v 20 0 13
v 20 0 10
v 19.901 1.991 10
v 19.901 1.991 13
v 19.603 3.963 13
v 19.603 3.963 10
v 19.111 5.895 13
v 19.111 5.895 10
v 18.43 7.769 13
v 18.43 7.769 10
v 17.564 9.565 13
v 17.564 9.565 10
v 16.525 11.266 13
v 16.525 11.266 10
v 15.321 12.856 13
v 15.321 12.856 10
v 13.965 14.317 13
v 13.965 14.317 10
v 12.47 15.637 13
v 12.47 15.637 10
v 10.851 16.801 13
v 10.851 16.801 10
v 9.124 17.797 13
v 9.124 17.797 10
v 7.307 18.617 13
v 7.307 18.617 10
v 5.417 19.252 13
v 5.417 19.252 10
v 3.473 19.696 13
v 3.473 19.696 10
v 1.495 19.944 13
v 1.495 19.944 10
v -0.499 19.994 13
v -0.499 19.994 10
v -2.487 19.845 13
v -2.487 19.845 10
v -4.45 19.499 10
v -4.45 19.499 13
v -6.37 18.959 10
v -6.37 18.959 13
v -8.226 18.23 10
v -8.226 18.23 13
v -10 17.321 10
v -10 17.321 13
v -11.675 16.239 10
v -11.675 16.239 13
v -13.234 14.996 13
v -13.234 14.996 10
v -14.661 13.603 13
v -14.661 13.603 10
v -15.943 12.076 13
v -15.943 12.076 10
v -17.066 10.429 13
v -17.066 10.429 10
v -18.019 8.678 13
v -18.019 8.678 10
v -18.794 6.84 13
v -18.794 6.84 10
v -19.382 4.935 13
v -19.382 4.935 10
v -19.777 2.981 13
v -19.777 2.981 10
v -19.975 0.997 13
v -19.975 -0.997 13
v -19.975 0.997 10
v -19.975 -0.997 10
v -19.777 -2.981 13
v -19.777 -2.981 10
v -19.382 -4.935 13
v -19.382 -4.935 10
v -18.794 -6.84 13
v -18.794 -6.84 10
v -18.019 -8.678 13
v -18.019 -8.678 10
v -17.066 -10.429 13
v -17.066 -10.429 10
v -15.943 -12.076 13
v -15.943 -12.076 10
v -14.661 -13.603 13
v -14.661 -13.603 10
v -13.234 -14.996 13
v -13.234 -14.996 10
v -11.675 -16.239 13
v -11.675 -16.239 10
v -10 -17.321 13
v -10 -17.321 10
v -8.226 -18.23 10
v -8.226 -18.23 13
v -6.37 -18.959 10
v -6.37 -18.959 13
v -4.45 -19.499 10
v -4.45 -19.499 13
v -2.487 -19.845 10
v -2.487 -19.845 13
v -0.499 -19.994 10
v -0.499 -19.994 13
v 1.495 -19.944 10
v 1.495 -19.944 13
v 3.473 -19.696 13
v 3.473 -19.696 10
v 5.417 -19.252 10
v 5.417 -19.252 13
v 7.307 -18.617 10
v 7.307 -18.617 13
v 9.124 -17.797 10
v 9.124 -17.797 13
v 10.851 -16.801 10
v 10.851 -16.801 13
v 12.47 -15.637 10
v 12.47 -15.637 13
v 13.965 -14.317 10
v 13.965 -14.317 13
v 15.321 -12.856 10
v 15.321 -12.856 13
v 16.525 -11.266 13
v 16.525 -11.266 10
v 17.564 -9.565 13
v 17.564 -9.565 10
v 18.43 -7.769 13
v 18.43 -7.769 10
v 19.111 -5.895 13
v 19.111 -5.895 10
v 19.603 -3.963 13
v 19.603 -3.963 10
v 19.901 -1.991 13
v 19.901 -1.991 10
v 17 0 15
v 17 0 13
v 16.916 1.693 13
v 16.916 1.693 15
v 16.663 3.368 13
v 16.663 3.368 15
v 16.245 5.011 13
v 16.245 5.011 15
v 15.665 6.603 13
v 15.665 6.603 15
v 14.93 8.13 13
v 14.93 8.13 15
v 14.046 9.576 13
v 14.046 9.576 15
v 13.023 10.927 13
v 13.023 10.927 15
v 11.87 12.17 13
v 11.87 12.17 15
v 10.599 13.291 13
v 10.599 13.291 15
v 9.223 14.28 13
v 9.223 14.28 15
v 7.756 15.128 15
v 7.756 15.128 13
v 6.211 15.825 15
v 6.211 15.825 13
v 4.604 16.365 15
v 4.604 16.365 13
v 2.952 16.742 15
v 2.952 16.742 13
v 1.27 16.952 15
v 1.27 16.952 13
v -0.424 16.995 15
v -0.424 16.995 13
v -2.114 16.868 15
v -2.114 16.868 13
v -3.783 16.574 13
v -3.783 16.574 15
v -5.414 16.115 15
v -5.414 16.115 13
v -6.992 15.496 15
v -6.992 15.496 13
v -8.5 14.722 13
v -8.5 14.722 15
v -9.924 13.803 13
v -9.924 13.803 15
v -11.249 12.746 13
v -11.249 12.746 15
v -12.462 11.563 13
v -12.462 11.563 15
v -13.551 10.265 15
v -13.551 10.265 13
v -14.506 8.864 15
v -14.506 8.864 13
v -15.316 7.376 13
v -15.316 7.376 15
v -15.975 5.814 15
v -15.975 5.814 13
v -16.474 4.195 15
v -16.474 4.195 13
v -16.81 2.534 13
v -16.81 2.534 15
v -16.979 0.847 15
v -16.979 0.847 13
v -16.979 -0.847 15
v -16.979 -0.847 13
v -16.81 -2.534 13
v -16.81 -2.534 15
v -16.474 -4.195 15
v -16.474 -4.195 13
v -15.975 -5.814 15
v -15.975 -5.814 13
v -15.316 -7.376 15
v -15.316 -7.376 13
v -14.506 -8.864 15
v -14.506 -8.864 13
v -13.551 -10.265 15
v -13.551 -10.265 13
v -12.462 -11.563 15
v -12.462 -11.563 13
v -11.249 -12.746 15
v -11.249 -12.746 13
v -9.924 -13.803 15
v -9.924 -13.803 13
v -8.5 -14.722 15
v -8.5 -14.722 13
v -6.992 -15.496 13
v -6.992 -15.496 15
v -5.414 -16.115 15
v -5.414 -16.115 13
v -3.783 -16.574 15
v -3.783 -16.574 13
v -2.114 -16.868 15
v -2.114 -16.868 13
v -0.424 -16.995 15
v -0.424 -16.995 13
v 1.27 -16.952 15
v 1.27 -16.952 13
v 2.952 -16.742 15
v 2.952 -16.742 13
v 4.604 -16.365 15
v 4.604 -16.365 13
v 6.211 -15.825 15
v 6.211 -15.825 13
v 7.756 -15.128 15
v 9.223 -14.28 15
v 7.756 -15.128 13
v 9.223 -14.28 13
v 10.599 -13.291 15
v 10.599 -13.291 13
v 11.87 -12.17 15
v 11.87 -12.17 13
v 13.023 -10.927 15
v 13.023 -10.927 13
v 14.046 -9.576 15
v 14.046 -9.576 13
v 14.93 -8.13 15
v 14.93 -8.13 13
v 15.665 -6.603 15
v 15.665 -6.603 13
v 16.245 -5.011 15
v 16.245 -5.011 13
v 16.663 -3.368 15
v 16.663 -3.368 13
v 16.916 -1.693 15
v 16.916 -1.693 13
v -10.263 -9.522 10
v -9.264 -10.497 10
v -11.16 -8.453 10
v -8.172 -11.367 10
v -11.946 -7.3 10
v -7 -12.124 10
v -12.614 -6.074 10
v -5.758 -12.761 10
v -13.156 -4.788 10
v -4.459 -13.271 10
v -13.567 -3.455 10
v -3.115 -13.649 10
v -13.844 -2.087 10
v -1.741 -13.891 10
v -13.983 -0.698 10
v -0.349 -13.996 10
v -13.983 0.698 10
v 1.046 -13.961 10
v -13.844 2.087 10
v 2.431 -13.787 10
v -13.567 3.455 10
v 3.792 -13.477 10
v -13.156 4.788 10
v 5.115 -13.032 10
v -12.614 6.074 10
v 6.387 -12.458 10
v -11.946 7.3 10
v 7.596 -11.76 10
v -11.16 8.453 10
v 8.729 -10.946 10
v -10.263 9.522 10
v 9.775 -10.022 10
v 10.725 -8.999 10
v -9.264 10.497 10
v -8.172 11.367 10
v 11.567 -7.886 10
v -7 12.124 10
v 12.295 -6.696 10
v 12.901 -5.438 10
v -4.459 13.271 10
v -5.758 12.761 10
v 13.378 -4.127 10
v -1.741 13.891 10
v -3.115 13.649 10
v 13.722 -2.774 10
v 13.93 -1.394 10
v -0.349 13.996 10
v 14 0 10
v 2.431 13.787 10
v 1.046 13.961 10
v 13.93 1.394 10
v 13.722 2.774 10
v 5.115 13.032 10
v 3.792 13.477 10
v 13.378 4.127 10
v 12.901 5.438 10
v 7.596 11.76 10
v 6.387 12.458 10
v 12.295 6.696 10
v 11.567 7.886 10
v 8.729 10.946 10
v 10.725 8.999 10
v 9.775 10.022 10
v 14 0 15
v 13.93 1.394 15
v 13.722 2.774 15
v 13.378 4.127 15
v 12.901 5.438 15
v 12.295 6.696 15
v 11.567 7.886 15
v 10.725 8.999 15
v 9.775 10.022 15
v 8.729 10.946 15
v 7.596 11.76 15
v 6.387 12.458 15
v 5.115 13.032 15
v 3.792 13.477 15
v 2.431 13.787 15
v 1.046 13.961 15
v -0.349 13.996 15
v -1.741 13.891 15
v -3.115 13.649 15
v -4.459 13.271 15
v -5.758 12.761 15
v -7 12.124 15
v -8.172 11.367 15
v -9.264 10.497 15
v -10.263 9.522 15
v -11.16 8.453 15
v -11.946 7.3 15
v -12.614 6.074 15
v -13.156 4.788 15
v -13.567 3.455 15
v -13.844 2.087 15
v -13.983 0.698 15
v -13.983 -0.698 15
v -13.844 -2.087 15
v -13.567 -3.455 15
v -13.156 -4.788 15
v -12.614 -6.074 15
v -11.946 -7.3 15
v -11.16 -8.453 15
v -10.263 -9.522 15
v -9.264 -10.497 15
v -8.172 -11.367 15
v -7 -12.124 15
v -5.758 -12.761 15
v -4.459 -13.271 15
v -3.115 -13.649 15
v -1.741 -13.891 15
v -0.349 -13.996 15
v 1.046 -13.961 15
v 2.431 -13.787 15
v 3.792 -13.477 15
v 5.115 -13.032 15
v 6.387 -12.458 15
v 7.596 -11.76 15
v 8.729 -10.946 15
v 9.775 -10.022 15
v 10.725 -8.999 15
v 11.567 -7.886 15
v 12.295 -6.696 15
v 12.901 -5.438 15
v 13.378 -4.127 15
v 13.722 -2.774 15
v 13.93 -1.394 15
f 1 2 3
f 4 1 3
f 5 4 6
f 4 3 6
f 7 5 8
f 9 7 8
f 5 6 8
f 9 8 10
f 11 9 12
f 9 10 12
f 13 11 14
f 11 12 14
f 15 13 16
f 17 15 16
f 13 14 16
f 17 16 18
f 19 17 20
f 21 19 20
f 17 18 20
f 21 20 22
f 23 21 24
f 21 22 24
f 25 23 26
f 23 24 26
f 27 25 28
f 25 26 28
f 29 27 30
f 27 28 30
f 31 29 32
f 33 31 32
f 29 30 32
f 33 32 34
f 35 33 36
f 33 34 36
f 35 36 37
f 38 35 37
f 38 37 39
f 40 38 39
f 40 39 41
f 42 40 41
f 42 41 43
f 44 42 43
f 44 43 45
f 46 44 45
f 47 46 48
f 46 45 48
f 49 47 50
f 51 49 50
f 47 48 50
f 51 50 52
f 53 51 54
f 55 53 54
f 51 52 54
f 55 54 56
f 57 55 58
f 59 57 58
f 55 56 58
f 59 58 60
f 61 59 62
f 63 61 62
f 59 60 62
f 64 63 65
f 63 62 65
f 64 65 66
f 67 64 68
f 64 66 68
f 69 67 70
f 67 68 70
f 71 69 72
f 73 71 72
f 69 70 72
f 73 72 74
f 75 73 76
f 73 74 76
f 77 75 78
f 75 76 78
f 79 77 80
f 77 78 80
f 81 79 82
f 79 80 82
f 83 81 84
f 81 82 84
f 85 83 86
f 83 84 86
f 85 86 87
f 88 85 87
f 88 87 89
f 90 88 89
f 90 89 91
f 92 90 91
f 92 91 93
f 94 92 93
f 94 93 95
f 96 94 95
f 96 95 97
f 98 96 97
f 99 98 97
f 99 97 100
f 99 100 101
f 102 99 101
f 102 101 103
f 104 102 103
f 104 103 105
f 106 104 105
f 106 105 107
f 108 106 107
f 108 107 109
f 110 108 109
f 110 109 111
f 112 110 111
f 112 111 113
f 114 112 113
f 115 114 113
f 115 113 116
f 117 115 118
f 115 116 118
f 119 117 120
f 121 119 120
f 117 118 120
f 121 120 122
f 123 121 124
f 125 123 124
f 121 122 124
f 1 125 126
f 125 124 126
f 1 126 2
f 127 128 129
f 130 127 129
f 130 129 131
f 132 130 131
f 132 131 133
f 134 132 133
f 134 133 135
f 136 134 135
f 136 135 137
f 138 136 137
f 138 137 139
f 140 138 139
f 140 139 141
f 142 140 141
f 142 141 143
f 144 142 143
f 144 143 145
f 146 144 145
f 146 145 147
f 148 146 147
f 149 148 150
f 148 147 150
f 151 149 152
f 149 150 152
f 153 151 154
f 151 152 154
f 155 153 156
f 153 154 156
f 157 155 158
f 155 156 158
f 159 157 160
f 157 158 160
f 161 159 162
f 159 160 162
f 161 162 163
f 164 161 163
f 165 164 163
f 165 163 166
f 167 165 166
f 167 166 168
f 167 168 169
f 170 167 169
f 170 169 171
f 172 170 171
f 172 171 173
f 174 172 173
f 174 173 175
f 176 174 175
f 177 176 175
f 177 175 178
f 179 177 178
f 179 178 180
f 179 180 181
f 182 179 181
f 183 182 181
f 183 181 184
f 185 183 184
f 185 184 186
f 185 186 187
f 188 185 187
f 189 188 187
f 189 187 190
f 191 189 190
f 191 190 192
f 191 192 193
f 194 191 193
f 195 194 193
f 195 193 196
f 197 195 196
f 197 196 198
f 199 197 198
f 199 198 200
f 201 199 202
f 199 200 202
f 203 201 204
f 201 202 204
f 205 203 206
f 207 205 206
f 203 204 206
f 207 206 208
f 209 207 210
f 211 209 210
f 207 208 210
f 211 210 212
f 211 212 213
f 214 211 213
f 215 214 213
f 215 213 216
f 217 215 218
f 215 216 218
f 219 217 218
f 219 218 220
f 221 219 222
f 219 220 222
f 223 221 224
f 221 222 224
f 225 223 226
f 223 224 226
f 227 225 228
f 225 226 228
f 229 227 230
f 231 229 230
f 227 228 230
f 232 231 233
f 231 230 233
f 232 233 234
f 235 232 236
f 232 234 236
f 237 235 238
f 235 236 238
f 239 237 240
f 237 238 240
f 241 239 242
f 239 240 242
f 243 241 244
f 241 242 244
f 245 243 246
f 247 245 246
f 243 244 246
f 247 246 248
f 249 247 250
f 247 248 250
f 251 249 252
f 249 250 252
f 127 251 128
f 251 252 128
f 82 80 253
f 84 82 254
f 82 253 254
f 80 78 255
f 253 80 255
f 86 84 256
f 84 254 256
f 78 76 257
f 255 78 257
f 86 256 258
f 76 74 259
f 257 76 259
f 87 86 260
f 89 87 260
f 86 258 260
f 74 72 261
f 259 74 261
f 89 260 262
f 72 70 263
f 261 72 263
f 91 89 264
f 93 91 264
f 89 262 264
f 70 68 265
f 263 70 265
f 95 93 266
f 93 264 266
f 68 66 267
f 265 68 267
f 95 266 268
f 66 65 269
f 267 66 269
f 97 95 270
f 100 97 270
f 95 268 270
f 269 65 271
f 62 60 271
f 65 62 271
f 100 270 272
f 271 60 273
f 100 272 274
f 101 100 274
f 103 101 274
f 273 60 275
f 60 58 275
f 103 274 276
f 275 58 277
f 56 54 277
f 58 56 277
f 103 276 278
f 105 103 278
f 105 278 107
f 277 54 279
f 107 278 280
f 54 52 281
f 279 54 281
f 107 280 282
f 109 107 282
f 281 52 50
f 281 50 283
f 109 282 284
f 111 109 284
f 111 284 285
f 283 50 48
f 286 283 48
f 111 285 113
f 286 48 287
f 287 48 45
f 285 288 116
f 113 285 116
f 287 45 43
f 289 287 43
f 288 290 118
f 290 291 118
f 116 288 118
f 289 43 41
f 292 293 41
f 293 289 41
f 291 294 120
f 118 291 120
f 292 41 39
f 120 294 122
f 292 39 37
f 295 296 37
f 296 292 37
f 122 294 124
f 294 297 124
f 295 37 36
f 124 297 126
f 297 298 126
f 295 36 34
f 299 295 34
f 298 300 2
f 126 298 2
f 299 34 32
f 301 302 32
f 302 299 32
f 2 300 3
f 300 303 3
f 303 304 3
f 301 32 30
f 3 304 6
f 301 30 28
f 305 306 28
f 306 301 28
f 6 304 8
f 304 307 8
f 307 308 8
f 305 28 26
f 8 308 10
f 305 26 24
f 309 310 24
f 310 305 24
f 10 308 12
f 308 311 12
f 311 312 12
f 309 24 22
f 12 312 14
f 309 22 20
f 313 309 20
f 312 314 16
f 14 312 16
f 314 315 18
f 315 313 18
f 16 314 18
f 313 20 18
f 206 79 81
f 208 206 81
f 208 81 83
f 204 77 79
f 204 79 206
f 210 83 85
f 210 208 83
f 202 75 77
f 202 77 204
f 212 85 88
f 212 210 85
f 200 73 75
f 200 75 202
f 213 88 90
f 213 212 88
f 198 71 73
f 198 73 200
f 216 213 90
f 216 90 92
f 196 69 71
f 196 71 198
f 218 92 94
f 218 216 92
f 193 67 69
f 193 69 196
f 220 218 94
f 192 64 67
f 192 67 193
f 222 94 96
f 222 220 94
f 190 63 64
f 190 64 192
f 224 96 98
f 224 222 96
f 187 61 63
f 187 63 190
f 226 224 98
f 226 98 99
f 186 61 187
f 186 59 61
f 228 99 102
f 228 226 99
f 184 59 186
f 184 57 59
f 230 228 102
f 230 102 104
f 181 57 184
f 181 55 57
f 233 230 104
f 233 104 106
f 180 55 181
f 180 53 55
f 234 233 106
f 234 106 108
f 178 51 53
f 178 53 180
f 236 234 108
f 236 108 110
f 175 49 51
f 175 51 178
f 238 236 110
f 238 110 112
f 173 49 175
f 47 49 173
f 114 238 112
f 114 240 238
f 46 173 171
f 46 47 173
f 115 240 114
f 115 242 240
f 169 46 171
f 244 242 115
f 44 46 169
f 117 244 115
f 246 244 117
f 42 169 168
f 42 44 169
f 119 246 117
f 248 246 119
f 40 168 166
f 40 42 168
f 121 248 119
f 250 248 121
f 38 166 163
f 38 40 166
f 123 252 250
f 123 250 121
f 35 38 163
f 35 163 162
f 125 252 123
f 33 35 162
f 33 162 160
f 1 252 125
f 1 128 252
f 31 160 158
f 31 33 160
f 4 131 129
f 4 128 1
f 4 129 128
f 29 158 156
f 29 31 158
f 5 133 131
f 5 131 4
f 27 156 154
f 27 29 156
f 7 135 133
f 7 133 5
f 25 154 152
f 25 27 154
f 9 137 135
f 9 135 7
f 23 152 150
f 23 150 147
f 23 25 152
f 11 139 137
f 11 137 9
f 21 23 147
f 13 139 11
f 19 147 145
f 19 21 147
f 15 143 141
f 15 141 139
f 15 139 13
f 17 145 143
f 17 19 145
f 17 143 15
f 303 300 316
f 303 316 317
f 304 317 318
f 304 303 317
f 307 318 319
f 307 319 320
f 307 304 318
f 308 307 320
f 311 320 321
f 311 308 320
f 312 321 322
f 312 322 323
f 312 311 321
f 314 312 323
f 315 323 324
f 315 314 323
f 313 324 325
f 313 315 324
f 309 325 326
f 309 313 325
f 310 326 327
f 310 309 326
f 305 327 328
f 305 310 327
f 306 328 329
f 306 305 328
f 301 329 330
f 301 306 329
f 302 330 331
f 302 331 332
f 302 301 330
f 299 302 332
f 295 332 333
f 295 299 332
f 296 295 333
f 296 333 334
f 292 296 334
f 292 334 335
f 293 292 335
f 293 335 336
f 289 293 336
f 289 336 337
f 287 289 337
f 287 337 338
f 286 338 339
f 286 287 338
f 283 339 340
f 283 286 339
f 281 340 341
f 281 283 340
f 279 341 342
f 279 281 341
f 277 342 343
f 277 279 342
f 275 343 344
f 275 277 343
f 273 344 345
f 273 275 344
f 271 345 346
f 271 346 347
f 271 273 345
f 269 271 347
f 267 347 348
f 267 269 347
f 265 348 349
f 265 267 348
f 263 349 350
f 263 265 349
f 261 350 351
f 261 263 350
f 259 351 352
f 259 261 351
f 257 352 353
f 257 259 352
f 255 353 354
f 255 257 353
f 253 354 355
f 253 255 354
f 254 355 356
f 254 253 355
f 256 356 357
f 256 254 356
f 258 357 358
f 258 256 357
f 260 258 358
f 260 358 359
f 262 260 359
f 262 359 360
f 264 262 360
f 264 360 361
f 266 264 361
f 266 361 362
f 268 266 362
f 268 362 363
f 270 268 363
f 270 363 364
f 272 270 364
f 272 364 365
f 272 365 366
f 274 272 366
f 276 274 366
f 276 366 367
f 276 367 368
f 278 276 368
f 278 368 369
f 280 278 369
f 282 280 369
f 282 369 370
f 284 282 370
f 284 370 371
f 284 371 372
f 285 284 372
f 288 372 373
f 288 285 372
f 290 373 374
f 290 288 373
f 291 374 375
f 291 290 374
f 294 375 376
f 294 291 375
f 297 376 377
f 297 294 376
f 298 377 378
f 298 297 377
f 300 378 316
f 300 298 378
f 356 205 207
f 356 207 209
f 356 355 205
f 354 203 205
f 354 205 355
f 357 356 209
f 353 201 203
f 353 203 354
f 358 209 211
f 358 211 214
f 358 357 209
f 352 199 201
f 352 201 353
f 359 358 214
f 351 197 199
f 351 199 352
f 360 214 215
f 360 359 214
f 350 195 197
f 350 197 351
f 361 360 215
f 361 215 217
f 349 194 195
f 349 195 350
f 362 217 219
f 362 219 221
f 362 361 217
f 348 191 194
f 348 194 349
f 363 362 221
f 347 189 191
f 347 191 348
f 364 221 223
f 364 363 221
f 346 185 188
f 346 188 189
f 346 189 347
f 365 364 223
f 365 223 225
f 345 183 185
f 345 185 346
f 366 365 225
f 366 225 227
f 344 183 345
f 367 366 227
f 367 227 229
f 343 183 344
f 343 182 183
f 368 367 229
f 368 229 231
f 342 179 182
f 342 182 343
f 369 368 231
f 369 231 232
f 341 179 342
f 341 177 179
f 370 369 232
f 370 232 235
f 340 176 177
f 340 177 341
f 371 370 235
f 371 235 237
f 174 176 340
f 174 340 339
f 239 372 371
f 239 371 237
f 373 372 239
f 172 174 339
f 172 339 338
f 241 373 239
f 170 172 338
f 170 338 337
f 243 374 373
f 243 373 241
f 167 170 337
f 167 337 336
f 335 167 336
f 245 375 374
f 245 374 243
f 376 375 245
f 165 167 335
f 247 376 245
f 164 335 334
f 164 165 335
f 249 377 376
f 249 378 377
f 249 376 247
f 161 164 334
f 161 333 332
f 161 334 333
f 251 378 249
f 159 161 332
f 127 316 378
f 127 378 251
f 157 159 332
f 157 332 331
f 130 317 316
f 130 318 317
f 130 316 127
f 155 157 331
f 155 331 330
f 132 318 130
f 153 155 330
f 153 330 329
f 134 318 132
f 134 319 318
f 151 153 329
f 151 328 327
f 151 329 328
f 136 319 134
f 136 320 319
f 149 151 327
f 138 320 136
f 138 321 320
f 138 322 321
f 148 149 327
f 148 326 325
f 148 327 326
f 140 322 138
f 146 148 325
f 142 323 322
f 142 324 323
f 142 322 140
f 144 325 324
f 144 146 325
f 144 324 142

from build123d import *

# Parameters (mm, degrees)
CYLINDER020_R     = 14
CYLINDER020_DEPTH = 5
CYLINDER018_R     = 20
CYLINDER018_DEPTH = 3
CYLINDER019_R     = 17
CYLINDER019_DEPTH = 5


with BuildPart() as cylinder004:
    # Cylinder020 → Cylinder020 (new body)
    with BuildSketch(Plane.XY):
        Circle(CYLINDER020_R)
    extrude(amount=CYLINDER020_DEPTH)


with BuildPart() as cylinder002:
    # Cylinder018 → Cylinder018 (new body)
    with BuildSketch(Plane.XY):
        Circle(CYLINDER018_R)
    extrude(amount=CYLINDER018_DEPTH)


with BuildPart() as cut031:
    # Cylinder019 → Cylinder019 (new body)
    with BuildSketch(Plane.XY):
        Circle(CYLINDER019_R)
    extrude(amount=CYLINDER019_DEPTH)

    # Fusion024: union Cylinder002
    add(cylinder002.part)

    # Cut031: cut Cylinder004
    add(cylinder004.part, mode=Mode.SUBTRACT)


with BuildPart() as cut031_1:
    # Cut031 placement: moved
    add(cut031.part.moved(Location((0, 0, 10))))


solid = cut031_1.part
